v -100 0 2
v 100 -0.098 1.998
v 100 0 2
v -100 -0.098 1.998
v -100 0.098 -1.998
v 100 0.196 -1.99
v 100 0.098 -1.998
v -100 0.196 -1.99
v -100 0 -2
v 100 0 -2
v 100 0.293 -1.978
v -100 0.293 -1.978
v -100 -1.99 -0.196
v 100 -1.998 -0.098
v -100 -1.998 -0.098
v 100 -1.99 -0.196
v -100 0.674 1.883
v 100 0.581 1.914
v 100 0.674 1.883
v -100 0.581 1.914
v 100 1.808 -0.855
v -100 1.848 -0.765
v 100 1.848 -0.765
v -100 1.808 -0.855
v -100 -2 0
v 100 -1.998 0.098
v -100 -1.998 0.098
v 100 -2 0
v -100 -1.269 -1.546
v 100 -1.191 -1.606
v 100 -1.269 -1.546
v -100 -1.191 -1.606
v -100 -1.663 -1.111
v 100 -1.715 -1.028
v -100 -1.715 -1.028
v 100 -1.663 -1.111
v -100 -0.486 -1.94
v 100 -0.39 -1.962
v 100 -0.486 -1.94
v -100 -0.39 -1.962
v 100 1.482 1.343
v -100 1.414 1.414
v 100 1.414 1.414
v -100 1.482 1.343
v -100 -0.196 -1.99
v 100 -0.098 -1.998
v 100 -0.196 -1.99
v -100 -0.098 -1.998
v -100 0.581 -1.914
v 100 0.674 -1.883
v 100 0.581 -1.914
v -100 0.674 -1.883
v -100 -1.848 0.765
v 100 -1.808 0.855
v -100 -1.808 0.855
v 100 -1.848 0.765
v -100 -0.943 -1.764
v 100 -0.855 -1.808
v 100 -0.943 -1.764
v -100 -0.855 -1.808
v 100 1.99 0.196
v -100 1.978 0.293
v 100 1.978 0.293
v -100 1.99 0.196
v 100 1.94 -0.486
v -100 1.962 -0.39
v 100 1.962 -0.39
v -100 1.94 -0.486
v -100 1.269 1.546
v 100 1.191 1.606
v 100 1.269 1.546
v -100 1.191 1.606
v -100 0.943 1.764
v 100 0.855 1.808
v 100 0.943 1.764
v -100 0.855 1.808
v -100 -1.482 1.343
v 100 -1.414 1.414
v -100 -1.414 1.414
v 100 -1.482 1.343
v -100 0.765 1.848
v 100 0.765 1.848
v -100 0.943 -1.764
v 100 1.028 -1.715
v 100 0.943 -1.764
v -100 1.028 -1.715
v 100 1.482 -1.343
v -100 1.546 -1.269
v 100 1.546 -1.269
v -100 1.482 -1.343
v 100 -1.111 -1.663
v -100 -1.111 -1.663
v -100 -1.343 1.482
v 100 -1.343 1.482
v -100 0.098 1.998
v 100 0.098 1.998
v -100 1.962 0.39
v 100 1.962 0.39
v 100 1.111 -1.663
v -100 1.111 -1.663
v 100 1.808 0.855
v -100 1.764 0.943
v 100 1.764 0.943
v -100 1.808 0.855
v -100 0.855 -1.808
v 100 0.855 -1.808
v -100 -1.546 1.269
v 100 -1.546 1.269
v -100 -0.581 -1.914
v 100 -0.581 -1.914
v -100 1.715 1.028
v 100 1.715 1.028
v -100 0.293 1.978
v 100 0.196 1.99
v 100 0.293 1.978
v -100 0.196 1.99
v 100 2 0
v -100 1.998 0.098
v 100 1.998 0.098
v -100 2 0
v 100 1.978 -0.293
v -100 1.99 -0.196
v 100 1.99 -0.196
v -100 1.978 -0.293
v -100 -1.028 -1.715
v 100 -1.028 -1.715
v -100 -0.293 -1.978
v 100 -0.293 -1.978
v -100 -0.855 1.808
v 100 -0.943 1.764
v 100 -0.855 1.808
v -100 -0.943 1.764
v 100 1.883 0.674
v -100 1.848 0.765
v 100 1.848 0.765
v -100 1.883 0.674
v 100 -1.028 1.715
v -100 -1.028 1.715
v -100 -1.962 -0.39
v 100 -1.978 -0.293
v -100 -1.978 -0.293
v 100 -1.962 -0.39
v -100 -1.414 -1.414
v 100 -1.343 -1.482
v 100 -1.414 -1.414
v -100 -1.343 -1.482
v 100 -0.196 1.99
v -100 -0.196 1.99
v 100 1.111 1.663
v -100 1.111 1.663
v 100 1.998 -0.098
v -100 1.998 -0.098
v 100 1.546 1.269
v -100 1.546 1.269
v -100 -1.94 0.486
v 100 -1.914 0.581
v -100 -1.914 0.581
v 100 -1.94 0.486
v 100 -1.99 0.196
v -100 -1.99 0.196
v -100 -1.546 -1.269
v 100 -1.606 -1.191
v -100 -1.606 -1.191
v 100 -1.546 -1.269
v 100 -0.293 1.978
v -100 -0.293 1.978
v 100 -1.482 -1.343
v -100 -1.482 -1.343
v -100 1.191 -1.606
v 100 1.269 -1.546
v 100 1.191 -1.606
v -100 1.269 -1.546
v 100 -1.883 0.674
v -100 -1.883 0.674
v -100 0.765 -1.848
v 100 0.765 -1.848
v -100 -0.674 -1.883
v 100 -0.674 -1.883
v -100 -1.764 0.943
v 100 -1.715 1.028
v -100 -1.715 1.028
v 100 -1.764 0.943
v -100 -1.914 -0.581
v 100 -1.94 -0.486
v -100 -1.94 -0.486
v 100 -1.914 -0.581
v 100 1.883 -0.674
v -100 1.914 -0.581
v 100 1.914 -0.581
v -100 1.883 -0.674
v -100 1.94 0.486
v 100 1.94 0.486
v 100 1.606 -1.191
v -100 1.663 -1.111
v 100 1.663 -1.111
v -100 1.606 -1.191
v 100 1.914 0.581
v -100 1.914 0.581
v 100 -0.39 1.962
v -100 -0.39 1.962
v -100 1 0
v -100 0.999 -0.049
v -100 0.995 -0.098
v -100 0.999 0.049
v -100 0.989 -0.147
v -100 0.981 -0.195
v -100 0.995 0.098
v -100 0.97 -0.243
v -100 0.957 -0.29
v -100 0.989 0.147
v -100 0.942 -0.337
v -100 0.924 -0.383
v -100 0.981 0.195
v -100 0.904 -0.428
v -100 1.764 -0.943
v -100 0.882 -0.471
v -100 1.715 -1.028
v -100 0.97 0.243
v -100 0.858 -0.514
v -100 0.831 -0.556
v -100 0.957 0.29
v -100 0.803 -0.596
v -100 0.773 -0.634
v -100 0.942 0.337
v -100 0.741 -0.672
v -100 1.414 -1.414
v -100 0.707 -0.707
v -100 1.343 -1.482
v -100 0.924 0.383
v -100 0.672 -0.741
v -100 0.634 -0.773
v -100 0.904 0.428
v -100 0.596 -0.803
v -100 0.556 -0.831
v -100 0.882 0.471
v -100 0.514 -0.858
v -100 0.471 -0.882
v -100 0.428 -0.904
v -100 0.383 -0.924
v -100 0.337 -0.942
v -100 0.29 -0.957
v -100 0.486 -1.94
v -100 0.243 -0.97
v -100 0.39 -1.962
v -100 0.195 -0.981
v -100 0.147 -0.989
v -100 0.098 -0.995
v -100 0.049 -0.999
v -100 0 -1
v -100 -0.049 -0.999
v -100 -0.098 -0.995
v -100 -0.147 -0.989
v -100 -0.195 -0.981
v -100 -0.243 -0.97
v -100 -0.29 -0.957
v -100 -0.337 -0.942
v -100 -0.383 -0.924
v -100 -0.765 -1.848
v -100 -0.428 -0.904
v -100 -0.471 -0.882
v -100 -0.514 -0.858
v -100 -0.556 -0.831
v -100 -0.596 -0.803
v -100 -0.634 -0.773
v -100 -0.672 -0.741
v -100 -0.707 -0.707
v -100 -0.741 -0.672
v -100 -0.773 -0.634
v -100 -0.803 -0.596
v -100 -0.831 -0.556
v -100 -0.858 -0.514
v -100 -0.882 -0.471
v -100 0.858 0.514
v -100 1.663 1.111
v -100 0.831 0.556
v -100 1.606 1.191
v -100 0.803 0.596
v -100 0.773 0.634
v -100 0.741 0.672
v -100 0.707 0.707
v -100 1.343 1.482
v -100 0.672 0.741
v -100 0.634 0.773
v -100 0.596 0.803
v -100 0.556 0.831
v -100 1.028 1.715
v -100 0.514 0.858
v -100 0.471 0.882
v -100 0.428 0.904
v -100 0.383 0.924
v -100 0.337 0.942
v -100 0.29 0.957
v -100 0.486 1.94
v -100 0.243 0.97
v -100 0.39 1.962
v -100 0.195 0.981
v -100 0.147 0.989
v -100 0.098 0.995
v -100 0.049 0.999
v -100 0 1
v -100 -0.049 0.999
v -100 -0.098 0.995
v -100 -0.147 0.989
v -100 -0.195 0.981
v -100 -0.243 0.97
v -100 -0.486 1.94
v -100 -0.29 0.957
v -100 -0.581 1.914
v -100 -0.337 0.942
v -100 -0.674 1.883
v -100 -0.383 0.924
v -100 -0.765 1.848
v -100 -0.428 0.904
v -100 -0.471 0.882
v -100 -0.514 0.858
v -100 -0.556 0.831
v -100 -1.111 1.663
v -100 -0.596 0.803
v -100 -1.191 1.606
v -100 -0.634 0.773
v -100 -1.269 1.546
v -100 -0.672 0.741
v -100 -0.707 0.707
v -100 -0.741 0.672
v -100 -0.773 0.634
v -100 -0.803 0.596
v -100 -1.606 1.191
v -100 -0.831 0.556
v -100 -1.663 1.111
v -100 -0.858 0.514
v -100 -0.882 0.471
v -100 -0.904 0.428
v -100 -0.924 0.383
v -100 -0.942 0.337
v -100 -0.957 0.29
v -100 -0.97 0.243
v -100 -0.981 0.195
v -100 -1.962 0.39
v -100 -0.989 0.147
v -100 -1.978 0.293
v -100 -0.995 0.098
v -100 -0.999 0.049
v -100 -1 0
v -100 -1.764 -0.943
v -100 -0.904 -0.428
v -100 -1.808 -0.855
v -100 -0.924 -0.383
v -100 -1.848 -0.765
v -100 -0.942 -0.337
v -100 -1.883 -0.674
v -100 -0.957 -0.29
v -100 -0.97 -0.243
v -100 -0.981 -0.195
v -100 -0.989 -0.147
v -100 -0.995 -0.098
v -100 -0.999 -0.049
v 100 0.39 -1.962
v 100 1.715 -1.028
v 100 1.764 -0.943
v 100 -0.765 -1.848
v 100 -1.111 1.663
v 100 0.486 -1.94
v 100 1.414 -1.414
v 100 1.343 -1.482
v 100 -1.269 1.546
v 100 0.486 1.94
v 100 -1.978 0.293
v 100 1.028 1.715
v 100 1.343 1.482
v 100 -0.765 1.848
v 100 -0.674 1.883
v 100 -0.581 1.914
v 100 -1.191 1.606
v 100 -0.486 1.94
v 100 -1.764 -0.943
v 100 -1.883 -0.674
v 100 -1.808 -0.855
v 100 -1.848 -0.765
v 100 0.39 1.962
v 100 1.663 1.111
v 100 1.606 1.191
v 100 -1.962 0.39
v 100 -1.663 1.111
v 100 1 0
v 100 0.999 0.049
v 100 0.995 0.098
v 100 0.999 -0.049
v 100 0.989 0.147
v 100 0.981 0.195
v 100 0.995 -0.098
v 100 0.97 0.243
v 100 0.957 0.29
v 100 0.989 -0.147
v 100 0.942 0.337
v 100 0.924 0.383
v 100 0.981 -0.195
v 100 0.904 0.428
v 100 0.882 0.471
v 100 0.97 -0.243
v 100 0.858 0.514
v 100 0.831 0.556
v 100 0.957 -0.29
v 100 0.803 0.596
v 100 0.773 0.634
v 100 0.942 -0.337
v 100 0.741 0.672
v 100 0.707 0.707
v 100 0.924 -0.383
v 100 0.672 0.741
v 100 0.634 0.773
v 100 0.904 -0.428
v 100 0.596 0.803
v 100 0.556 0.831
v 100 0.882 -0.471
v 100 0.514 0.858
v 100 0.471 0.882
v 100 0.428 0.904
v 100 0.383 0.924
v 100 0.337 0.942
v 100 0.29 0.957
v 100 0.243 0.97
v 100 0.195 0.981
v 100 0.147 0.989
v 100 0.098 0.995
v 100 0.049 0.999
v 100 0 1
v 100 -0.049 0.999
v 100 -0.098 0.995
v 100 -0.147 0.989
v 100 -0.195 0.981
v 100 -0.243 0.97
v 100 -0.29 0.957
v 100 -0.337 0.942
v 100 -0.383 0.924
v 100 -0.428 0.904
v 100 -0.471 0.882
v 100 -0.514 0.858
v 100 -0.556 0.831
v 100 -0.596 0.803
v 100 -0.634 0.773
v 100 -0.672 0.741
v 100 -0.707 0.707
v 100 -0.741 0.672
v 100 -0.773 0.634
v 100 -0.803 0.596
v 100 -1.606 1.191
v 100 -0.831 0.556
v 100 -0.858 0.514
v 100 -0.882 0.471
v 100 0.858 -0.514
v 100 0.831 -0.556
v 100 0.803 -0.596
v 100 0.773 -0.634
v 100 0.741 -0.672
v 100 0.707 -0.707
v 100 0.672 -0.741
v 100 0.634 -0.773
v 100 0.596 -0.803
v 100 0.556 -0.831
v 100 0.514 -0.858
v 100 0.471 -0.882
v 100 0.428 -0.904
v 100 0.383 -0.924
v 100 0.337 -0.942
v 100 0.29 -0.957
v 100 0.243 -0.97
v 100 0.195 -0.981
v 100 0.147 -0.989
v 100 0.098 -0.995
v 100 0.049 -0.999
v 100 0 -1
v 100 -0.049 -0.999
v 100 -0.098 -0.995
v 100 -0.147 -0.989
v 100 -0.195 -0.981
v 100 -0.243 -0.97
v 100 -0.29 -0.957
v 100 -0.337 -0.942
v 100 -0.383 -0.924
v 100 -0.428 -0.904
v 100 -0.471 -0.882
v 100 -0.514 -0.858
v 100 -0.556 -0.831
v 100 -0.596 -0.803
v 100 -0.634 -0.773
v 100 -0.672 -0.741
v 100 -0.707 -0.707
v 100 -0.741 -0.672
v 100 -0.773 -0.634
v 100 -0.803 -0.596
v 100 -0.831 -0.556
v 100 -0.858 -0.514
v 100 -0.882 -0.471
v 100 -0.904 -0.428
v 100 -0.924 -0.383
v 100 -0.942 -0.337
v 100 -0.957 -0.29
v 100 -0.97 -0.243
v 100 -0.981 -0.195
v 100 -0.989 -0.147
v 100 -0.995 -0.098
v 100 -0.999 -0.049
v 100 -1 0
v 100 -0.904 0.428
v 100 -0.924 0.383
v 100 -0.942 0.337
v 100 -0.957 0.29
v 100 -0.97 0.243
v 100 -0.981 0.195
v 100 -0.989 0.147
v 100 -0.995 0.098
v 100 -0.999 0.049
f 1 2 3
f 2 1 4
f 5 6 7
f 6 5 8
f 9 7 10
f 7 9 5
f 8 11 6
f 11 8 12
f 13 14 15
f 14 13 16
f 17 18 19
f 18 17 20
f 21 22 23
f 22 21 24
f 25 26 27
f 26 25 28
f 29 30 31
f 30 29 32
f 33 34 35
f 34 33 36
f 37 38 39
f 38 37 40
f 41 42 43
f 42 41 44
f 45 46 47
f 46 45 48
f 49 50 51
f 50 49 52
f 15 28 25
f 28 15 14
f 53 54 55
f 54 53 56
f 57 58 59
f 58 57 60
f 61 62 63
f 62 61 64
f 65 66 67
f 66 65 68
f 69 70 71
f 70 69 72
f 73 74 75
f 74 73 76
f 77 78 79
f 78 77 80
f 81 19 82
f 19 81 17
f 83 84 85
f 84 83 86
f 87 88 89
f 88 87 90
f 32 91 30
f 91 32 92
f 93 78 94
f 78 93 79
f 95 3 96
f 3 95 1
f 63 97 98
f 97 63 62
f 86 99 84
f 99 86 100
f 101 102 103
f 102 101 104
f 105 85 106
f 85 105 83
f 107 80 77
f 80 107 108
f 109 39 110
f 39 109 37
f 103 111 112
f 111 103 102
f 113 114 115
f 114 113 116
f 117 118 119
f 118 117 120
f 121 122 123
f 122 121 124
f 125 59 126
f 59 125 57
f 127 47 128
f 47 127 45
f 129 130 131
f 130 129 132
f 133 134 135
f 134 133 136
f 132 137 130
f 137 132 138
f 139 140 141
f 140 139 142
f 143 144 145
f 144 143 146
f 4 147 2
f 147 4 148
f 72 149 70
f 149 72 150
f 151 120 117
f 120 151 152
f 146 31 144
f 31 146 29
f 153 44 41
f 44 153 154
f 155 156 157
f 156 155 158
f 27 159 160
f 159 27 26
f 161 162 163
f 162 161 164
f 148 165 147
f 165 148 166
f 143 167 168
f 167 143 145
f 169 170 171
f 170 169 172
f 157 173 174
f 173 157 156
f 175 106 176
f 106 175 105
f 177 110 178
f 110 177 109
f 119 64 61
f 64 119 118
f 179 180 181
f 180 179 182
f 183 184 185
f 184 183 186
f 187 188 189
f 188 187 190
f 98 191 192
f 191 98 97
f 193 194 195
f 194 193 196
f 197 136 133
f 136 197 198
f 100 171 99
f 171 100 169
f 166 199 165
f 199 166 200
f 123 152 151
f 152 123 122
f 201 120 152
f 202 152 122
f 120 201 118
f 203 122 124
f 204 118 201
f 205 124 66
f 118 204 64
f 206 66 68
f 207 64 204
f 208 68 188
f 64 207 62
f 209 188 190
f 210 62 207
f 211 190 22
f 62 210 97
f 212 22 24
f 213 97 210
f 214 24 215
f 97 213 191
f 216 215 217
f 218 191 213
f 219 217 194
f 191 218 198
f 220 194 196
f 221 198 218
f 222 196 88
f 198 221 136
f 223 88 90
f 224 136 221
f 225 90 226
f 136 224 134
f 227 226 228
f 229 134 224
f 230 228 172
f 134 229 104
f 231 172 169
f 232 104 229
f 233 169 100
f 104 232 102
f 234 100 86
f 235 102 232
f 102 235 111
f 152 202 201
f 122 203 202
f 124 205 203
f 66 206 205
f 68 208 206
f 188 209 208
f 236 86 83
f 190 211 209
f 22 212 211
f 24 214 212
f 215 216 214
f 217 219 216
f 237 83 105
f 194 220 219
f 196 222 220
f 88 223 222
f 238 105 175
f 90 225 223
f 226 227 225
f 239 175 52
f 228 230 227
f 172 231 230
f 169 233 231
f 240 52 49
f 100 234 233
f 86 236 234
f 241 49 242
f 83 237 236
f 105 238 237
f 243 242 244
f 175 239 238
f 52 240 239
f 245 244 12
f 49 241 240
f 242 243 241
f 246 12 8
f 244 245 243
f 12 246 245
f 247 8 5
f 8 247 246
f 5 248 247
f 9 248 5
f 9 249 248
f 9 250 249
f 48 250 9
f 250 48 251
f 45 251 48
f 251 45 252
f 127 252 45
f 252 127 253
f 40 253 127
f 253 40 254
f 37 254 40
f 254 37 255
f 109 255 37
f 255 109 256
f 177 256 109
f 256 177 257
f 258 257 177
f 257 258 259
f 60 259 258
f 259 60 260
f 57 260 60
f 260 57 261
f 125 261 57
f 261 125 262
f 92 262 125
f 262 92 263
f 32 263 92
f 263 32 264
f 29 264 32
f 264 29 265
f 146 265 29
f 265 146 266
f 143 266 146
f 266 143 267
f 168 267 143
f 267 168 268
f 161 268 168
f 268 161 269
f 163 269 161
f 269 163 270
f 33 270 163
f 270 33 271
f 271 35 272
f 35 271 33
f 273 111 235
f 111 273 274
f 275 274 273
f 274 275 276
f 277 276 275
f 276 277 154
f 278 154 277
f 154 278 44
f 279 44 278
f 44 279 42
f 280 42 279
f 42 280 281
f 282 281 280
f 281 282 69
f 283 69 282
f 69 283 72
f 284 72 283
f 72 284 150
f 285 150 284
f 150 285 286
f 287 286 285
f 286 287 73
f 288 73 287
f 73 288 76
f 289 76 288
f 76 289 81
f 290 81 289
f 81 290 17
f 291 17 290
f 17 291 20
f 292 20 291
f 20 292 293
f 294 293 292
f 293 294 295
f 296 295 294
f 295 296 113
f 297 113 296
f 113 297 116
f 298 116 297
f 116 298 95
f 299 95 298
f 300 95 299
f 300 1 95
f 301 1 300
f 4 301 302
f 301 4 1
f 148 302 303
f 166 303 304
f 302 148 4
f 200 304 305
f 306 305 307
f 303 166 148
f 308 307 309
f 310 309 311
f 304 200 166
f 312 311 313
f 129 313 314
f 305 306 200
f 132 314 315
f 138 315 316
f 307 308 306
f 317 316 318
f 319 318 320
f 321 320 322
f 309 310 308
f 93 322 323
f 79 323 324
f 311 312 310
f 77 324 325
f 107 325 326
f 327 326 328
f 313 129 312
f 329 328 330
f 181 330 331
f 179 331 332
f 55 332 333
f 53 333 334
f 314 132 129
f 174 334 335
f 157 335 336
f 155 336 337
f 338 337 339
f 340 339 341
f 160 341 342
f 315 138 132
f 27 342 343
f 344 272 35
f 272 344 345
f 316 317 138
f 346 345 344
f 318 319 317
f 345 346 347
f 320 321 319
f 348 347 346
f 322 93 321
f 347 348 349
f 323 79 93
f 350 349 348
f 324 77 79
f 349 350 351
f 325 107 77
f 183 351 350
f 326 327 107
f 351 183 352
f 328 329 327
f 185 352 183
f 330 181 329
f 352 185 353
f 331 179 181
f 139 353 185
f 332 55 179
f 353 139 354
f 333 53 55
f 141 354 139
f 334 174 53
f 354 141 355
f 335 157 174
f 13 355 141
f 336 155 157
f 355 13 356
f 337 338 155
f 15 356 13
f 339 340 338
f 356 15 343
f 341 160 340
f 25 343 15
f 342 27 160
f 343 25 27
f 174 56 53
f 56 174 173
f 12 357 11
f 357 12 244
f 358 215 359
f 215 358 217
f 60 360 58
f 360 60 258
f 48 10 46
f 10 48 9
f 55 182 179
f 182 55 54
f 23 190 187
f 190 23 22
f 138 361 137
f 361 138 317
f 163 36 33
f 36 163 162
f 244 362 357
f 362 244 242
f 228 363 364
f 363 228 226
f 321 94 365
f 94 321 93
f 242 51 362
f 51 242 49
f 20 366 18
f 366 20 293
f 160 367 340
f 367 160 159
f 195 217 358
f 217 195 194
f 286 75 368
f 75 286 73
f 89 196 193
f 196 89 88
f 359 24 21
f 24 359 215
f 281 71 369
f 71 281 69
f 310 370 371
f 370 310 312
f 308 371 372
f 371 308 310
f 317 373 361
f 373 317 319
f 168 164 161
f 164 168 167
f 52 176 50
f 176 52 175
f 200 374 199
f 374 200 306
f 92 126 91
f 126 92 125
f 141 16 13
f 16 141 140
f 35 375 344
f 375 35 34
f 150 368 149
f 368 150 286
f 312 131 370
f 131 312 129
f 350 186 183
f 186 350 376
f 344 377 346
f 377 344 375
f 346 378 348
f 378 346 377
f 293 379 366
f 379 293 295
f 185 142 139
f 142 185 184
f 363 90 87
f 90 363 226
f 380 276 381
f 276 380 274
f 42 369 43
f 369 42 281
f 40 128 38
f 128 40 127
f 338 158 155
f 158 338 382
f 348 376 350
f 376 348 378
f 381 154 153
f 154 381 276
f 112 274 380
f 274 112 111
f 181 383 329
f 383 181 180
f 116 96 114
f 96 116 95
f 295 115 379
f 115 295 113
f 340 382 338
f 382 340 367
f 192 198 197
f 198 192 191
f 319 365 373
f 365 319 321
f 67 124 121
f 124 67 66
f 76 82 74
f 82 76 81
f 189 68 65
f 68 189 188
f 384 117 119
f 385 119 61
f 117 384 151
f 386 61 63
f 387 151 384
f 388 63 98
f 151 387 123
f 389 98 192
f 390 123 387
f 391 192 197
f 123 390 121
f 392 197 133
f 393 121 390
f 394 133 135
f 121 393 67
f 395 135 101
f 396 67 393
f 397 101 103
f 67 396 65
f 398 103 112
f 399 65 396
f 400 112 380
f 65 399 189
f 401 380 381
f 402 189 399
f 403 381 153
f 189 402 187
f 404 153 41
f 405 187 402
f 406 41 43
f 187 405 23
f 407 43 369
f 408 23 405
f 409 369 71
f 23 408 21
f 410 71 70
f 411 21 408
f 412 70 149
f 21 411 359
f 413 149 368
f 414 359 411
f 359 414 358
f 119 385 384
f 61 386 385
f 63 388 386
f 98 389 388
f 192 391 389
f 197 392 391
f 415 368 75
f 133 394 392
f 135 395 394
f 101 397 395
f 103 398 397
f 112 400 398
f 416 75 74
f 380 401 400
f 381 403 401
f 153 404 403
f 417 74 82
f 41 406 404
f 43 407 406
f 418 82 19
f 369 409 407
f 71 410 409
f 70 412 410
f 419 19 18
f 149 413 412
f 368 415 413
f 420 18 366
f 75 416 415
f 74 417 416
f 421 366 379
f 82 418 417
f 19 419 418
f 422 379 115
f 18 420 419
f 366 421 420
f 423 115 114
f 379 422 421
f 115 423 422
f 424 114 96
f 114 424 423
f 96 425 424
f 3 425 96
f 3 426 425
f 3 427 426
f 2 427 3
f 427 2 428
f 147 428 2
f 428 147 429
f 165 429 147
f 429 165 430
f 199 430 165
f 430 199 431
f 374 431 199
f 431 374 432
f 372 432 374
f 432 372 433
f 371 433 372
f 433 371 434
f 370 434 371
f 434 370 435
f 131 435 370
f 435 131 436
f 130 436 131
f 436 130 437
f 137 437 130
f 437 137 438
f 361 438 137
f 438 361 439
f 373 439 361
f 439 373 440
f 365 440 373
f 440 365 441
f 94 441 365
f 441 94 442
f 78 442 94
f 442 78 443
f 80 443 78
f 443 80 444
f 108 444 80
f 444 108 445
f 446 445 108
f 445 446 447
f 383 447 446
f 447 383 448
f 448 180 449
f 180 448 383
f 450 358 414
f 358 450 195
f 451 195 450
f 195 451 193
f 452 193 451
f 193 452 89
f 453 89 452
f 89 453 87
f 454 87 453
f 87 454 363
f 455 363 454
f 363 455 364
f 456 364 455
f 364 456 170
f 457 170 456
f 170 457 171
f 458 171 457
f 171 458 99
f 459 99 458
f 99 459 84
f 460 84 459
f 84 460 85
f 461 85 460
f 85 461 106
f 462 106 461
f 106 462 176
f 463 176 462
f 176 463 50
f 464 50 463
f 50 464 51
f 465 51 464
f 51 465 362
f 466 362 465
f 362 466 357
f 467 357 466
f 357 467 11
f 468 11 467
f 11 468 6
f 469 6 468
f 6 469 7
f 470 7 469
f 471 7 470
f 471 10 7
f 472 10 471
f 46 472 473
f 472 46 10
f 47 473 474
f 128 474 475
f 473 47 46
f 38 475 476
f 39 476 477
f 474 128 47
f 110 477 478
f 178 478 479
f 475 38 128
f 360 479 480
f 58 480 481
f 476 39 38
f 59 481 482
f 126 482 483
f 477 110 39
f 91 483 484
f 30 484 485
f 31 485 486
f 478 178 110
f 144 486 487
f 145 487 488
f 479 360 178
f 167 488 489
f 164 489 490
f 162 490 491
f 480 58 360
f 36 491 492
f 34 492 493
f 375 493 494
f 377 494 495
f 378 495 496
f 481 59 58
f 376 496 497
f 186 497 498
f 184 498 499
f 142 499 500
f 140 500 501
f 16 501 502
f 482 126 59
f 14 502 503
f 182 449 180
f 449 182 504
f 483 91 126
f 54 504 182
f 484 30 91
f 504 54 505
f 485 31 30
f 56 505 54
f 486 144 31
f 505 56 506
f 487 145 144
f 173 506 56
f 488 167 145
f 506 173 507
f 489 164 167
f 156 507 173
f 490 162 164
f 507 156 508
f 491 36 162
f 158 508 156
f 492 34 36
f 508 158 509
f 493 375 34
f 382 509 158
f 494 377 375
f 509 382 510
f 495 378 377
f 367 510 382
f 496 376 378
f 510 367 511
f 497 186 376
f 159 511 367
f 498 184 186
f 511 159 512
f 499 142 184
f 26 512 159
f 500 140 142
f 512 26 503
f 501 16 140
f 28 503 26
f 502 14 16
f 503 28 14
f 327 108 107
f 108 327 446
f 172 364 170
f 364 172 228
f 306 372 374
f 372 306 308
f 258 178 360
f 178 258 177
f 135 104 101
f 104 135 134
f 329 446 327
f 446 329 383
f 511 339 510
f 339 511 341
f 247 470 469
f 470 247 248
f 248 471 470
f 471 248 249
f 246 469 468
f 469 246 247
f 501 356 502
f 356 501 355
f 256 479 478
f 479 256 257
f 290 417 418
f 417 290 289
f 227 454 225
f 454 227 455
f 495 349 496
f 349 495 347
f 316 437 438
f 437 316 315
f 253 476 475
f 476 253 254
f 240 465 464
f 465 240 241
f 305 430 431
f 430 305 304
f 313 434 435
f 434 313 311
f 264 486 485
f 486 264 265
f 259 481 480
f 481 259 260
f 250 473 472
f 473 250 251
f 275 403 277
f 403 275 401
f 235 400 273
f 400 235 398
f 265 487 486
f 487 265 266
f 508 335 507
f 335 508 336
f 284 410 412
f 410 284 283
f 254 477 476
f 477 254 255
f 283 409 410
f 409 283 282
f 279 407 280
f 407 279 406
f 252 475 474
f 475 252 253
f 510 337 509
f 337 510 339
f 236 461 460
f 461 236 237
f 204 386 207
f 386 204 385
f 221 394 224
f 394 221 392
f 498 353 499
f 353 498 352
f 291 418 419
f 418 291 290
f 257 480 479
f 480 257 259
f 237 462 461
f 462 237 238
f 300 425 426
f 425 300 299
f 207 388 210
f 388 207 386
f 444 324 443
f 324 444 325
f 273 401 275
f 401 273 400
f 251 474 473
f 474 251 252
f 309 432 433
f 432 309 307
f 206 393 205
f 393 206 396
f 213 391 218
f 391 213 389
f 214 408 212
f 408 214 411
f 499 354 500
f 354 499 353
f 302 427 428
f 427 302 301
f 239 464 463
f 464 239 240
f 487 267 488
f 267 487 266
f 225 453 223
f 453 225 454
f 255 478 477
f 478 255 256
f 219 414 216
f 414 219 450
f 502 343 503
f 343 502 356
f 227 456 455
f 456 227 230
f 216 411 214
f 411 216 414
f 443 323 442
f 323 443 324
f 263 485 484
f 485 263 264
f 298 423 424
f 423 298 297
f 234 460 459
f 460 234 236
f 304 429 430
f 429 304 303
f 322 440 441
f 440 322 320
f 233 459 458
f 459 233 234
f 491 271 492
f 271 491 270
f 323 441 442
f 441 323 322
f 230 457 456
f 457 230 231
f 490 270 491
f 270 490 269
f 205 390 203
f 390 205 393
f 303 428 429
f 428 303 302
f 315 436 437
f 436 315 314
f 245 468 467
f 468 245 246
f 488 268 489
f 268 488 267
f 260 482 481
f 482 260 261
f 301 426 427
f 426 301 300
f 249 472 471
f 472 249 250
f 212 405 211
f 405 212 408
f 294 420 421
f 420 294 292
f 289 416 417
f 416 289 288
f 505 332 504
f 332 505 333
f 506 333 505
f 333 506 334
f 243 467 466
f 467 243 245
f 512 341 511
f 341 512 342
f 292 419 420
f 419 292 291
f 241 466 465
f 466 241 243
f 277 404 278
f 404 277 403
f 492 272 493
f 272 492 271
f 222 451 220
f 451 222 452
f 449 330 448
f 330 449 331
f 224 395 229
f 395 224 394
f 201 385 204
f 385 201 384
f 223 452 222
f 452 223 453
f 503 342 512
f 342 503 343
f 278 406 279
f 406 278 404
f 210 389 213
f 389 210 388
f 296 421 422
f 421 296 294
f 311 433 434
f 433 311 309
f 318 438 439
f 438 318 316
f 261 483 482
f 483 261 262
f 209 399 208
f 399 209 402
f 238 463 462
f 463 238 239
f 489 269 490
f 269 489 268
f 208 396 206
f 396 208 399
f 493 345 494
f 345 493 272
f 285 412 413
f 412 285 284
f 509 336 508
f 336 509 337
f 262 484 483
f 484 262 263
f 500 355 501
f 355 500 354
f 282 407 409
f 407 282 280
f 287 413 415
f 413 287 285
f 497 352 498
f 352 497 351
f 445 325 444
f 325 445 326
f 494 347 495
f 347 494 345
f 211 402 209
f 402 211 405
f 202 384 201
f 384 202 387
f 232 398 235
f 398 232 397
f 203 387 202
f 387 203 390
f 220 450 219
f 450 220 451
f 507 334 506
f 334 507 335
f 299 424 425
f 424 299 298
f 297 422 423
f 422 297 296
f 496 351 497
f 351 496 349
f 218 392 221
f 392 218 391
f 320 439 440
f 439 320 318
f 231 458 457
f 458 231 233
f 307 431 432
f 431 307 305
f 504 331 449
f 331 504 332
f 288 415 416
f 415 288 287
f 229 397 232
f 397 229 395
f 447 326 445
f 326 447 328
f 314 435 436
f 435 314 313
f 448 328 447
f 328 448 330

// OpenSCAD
$fn = 128;

// PTFE tubing (hollow cylinder)
// Units: mm
outer_d = 4.0;     // OD
inner_d = 2.0;     // ID
length  = 200.0;   // tube length

module ptfe_tube(od, id, len) {
    eps = 0.2;
    od_ok = (od > 0) && (len > 0);
    id_ok = (id > 0) && (od > id);

    color([0.95, 0.95, 0.95])
    rotate([0, 90, 0])  // axis along X
    difference() {
        // Outer tube
        cylinder(d=od, h=len, center=true);

        // Inner bore (slightly longer to guarantee a clean through-hole)
        if (od_ok && id_ok)
            cylinder(d=id, h=len + 2*eps, center=true);
    }
}

ptfe_tube(outer_d, inner_d, length);
